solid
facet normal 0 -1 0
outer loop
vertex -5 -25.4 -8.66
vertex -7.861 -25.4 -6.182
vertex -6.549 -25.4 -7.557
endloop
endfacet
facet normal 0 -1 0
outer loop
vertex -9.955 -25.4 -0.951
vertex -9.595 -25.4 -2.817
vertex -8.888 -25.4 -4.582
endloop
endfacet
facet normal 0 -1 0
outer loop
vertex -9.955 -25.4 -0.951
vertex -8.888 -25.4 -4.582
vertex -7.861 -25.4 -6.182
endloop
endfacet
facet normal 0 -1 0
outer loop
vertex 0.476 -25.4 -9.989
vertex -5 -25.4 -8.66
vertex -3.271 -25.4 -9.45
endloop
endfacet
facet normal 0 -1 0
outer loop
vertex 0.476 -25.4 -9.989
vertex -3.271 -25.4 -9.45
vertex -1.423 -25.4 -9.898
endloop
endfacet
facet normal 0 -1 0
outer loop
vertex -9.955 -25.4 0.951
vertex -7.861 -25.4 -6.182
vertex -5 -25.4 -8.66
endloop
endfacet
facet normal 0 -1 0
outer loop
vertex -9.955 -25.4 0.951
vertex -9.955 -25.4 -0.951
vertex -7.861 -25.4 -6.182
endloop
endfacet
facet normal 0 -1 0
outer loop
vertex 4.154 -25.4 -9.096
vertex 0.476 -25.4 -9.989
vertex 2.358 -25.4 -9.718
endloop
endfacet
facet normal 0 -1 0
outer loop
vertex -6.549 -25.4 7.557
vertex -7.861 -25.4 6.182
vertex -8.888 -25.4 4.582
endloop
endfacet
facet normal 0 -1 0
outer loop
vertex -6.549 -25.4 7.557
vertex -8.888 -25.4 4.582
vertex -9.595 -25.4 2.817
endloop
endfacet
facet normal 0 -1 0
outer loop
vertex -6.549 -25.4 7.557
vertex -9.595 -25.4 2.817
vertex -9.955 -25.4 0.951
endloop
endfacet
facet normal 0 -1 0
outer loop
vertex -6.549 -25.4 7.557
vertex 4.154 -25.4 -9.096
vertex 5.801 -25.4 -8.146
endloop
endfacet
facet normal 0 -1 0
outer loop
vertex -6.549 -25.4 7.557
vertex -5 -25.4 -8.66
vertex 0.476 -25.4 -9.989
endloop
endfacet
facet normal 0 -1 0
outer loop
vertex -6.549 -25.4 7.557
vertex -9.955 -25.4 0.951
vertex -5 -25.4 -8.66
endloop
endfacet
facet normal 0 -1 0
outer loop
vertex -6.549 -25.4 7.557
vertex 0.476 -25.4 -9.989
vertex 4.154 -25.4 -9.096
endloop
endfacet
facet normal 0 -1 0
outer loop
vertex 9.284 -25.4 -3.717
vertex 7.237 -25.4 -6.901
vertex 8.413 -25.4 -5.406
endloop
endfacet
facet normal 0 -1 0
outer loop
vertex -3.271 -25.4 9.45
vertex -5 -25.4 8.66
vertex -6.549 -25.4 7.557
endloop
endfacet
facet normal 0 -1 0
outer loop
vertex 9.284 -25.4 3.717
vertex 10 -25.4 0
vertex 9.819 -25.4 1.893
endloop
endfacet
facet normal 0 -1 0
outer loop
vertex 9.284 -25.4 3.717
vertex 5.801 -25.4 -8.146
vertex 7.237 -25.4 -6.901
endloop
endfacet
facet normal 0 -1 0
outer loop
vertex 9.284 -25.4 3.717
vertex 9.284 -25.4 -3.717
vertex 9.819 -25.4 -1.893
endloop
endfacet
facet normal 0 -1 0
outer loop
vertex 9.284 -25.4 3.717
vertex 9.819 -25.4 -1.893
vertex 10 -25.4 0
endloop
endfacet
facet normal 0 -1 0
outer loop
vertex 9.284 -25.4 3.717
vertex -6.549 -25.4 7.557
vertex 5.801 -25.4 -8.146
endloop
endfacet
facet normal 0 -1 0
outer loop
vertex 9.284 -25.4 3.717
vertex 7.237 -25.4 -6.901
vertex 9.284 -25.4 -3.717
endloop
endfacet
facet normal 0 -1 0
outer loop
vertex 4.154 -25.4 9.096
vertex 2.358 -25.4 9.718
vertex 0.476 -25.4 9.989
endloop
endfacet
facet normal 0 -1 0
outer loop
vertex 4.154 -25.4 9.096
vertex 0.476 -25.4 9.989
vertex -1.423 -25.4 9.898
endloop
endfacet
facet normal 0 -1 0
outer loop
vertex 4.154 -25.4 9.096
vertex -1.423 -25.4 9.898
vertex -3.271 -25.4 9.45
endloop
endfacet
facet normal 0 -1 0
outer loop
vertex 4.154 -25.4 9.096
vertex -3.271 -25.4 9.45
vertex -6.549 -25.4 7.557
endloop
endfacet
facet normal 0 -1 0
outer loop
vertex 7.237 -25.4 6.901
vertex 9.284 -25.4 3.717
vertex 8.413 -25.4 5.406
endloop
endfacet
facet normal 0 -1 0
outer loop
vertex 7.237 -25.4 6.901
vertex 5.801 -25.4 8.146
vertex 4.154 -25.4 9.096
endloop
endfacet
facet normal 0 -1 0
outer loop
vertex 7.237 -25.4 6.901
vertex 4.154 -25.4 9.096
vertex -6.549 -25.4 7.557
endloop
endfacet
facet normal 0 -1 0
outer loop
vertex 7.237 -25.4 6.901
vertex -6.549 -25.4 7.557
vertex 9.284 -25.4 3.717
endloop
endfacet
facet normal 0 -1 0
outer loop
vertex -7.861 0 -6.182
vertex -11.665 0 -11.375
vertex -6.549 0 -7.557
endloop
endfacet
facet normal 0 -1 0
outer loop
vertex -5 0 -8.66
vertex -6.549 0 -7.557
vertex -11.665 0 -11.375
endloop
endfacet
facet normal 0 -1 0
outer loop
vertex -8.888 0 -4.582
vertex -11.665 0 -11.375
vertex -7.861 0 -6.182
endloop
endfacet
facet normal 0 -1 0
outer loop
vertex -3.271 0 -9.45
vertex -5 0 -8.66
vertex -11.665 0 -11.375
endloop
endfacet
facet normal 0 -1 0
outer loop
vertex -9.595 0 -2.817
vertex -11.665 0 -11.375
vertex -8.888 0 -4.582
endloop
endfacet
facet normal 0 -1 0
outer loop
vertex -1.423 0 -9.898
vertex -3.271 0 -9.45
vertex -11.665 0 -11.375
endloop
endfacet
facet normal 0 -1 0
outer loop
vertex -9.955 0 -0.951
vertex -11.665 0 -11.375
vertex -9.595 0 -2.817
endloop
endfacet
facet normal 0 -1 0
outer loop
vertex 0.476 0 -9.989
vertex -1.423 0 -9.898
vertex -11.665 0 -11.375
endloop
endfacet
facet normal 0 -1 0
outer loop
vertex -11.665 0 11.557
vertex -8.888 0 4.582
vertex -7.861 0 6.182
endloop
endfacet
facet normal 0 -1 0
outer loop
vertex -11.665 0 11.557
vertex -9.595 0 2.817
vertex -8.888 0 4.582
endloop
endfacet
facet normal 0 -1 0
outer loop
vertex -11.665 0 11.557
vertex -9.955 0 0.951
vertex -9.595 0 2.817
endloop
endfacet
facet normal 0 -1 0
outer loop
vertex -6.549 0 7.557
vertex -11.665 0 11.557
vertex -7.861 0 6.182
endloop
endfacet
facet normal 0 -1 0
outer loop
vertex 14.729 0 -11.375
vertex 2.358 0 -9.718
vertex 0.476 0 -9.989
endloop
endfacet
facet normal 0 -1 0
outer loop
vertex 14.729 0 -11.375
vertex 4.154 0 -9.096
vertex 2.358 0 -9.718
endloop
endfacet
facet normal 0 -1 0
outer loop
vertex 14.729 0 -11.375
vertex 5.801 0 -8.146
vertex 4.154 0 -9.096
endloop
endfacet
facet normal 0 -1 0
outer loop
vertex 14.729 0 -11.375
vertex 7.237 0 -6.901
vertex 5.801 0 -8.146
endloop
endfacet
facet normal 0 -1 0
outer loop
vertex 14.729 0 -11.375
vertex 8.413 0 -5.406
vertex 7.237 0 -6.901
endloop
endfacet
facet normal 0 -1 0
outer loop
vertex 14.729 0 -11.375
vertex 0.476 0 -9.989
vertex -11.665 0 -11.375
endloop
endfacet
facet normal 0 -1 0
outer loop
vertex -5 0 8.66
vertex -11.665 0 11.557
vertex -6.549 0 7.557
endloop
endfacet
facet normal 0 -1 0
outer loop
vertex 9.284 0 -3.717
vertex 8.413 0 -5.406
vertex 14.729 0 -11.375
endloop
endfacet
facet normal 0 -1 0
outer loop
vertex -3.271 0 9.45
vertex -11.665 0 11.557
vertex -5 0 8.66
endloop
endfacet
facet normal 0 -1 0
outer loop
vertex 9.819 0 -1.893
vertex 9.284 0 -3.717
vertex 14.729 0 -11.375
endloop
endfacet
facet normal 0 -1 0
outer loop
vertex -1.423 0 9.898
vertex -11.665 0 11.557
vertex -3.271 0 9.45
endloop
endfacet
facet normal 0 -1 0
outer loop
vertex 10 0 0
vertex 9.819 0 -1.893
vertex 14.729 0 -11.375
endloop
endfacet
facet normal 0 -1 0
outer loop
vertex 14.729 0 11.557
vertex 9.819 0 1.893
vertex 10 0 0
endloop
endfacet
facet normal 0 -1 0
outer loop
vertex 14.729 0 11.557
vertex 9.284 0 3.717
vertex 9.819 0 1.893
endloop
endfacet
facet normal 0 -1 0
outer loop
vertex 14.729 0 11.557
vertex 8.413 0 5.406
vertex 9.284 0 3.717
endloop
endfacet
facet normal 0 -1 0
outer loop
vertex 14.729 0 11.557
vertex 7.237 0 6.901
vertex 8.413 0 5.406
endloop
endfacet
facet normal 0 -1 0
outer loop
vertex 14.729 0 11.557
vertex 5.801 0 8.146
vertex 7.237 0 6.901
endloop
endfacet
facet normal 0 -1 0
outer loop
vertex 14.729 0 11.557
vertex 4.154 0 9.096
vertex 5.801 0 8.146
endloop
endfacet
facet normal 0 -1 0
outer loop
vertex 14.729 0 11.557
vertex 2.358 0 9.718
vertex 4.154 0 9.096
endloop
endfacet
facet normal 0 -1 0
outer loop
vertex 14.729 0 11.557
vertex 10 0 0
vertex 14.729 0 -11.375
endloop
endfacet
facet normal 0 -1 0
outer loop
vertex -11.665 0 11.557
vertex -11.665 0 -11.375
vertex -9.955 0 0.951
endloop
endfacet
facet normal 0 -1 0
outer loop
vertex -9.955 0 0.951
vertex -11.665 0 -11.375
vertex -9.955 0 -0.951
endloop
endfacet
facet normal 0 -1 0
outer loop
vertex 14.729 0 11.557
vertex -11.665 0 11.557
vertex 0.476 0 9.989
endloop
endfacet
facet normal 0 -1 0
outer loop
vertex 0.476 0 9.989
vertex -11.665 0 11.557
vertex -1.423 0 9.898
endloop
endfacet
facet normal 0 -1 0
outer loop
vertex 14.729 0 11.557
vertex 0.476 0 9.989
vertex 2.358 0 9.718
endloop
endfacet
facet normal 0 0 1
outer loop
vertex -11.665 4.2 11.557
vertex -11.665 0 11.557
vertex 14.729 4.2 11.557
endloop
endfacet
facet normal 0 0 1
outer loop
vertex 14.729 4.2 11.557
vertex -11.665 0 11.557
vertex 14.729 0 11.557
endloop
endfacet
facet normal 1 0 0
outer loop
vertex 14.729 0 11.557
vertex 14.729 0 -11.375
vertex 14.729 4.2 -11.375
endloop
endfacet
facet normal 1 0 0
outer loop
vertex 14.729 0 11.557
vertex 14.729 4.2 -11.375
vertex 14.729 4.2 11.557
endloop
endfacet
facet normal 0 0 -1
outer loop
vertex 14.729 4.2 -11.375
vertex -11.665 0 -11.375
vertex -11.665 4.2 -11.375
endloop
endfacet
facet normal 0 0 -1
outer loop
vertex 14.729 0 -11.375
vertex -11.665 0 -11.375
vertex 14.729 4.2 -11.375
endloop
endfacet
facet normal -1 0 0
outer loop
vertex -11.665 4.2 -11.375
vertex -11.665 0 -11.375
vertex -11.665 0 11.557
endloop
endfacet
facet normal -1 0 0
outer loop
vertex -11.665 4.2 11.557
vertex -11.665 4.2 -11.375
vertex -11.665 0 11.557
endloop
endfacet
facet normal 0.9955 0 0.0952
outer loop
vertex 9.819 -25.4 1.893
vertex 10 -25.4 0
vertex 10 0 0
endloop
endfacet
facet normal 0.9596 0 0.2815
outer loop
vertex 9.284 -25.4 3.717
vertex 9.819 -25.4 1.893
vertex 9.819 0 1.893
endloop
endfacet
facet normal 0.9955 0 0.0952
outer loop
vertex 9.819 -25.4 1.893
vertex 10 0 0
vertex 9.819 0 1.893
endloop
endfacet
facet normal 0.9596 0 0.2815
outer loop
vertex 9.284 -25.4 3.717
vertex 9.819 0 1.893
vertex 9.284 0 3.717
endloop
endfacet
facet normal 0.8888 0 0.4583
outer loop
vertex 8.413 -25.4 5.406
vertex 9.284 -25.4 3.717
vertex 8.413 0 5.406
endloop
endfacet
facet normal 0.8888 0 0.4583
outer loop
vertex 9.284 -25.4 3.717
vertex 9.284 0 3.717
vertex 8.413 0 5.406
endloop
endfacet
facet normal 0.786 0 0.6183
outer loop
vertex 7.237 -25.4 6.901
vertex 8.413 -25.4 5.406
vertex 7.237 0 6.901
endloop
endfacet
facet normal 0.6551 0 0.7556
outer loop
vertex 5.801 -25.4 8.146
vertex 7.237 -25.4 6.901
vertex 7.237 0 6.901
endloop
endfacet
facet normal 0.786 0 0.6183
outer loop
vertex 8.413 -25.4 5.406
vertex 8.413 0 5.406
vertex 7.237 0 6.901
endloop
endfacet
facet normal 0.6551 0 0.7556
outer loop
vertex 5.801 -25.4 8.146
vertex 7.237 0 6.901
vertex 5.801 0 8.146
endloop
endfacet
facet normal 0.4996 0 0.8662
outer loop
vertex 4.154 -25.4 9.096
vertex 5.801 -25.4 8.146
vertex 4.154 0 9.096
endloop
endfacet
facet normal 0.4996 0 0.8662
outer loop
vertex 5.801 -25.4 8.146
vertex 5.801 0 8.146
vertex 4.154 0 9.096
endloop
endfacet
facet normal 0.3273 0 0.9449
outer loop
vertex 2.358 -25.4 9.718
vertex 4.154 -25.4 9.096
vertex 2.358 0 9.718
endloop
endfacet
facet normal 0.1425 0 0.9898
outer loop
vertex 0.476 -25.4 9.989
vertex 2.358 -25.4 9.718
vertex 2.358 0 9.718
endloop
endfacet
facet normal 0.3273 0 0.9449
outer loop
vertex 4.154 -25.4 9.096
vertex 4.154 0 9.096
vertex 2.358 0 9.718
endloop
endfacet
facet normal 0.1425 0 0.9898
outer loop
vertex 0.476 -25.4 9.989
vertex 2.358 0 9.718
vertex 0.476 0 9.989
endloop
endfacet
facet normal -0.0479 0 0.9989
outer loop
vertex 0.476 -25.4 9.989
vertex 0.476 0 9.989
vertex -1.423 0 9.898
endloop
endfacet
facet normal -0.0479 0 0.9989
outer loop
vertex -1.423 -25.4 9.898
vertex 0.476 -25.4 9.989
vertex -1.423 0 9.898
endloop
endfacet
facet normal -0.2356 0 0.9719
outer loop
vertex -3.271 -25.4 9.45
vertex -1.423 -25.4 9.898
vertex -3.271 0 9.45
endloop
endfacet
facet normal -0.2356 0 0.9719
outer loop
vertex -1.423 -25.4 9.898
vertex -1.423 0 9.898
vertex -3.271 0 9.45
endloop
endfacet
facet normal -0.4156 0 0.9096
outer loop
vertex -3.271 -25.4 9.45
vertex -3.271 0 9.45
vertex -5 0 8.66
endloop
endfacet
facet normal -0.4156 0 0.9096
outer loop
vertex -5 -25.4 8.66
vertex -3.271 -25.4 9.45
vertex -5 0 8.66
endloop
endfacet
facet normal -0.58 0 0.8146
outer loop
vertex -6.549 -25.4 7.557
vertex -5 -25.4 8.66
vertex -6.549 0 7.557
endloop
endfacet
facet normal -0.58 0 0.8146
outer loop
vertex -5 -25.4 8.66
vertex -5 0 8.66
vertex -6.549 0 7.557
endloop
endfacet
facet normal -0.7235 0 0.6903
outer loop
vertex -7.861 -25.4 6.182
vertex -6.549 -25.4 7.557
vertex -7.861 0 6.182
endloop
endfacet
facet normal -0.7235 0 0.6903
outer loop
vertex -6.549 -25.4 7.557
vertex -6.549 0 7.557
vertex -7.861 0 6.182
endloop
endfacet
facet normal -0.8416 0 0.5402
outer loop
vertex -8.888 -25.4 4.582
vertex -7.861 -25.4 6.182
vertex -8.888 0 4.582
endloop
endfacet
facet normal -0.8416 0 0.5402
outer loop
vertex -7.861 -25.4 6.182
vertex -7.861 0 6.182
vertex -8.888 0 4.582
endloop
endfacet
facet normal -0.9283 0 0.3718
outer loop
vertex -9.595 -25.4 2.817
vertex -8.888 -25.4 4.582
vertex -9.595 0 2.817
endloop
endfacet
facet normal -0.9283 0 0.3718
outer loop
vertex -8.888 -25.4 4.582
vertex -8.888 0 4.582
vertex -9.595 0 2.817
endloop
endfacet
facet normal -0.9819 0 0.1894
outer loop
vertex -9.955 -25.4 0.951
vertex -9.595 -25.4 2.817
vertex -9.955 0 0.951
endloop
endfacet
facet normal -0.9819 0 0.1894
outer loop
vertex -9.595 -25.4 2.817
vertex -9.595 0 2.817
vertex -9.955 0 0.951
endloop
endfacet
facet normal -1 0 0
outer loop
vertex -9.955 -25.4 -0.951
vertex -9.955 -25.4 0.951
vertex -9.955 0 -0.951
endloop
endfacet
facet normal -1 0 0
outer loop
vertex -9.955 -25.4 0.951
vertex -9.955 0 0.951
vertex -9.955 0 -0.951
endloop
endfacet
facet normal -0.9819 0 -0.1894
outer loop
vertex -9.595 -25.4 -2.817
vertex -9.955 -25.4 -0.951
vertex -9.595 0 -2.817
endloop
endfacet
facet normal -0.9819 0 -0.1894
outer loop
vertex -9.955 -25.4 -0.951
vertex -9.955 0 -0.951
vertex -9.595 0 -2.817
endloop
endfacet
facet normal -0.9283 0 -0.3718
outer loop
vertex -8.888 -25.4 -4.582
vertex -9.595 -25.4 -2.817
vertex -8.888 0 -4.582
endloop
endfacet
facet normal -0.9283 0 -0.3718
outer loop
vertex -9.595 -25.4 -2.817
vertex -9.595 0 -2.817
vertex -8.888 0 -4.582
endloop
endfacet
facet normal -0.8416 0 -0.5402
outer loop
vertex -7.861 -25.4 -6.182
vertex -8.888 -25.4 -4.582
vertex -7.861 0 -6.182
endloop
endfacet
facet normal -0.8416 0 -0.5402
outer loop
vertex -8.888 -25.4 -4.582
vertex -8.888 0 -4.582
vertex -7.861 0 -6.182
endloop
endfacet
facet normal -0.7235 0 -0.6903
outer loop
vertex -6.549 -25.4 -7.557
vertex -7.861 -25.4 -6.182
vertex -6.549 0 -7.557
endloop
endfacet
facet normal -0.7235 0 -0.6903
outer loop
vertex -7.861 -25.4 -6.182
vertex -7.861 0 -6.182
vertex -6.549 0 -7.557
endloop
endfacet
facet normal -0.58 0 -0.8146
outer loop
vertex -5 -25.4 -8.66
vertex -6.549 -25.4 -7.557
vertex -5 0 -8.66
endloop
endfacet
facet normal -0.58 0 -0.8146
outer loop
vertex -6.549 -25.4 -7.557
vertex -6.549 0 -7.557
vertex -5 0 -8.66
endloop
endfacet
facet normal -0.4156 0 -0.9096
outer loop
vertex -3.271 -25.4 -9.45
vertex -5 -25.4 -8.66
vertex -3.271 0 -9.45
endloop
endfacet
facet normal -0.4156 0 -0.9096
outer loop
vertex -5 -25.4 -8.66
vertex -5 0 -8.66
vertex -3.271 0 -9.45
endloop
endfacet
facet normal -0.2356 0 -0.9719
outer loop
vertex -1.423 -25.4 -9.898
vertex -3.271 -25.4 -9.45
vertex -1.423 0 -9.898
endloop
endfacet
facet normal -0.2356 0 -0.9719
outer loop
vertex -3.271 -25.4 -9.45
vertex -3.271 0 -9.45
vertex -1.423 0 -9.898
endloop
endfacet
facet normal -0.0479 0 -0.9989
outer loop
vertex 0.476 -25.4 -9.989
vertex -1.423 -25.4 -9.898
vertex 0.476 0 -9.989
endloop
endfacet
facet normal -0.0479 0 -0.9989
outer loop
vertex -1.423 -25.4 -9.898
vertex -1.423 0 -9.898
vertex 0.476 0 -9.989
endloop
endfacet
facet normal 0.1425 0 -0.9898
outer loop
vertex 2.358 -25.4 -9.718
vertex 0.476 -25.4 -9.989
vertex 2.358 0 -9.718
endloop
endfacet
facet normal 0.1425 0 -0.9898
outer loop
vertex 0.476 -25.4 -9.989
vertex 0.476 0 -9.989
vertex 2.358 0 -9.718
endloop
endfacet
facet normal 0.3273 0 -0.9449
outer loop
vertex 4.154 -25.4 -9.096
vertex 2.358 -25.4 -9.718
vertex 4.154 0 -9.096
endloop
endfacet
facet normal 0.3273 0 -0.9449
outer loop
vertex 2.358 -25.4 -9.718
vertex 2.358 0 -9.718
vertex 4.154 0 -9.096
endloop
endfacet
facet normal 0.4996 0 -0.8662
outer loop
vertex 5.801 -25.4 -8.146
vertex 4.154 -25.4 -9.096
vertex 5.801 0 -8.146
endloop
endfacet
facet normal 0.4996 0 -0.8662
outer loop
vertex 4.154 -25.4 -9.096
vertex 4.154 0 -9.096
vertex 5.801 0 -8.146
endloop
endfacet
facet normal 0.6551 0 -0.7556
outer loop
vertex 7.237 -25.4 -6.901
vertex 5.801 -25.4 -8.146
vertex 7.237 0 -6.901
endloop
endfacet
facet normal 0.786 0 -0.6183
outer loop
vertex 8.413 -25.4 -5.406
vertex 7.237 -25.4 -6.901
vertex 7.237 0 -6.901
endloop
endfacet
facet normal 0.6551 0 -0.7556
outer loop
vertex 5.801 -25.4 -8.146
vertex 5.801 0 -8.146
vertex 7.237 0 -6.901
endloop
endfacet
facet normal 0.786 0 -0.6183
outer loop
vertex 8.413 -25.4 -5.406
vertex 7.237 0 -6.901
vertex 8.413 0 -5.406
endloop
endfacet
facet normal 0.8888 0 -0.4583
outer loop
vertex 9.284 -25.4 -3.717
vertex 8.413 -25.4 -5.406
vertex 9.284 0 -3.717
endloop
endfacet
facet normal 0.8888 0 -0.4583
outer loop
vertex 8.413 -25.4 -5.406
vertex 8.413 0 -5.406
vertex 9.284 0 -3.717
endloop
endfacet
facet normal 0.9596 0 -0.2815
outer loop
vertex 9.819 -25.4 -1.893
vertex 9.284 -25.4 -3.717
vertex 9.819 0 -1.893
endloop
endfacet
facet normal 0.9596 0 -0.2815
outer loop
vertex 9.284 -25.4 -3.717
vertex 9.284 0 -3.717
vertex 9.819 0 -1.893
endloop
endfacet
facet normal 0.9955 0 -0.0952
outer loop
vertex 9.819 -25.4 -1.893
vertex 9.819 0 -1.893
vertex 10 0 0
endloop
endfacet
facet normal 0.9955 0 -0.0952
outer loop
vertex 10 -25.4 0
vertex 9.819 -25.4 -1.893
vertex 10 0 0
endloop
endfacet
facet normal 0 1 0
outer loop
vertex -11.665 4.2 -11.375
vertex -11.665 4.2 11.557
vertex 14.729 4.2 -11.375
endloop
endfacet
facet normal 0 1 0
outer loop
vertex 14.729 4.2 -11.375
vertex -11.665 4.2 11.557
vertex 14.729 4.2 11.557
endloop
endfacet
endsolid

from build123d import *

# Parameters (mm, degrees)
F0_R     = 10
F1_DEPTH = 25.4
F2_W     = 26.393833
F2_H     = 22.931724
F3_DEPTH = 4.2


with BuildPart() as f1:
    # F0 (on Front) → F1 (new body)
    with BuildSketch(Plane.XZ):
        Circle(F0_R)
    extrude(amount=F1_DEPTH)

    # F2 (on Front) → F3 (join)
    with BuildSketch(Plane.XZ):
        with Locations((1.531839, 0.090714)):
            Rectangle(F2_W, F2_H)
    extrude(amount=-F3_DEPTH)


solid = f1.part
